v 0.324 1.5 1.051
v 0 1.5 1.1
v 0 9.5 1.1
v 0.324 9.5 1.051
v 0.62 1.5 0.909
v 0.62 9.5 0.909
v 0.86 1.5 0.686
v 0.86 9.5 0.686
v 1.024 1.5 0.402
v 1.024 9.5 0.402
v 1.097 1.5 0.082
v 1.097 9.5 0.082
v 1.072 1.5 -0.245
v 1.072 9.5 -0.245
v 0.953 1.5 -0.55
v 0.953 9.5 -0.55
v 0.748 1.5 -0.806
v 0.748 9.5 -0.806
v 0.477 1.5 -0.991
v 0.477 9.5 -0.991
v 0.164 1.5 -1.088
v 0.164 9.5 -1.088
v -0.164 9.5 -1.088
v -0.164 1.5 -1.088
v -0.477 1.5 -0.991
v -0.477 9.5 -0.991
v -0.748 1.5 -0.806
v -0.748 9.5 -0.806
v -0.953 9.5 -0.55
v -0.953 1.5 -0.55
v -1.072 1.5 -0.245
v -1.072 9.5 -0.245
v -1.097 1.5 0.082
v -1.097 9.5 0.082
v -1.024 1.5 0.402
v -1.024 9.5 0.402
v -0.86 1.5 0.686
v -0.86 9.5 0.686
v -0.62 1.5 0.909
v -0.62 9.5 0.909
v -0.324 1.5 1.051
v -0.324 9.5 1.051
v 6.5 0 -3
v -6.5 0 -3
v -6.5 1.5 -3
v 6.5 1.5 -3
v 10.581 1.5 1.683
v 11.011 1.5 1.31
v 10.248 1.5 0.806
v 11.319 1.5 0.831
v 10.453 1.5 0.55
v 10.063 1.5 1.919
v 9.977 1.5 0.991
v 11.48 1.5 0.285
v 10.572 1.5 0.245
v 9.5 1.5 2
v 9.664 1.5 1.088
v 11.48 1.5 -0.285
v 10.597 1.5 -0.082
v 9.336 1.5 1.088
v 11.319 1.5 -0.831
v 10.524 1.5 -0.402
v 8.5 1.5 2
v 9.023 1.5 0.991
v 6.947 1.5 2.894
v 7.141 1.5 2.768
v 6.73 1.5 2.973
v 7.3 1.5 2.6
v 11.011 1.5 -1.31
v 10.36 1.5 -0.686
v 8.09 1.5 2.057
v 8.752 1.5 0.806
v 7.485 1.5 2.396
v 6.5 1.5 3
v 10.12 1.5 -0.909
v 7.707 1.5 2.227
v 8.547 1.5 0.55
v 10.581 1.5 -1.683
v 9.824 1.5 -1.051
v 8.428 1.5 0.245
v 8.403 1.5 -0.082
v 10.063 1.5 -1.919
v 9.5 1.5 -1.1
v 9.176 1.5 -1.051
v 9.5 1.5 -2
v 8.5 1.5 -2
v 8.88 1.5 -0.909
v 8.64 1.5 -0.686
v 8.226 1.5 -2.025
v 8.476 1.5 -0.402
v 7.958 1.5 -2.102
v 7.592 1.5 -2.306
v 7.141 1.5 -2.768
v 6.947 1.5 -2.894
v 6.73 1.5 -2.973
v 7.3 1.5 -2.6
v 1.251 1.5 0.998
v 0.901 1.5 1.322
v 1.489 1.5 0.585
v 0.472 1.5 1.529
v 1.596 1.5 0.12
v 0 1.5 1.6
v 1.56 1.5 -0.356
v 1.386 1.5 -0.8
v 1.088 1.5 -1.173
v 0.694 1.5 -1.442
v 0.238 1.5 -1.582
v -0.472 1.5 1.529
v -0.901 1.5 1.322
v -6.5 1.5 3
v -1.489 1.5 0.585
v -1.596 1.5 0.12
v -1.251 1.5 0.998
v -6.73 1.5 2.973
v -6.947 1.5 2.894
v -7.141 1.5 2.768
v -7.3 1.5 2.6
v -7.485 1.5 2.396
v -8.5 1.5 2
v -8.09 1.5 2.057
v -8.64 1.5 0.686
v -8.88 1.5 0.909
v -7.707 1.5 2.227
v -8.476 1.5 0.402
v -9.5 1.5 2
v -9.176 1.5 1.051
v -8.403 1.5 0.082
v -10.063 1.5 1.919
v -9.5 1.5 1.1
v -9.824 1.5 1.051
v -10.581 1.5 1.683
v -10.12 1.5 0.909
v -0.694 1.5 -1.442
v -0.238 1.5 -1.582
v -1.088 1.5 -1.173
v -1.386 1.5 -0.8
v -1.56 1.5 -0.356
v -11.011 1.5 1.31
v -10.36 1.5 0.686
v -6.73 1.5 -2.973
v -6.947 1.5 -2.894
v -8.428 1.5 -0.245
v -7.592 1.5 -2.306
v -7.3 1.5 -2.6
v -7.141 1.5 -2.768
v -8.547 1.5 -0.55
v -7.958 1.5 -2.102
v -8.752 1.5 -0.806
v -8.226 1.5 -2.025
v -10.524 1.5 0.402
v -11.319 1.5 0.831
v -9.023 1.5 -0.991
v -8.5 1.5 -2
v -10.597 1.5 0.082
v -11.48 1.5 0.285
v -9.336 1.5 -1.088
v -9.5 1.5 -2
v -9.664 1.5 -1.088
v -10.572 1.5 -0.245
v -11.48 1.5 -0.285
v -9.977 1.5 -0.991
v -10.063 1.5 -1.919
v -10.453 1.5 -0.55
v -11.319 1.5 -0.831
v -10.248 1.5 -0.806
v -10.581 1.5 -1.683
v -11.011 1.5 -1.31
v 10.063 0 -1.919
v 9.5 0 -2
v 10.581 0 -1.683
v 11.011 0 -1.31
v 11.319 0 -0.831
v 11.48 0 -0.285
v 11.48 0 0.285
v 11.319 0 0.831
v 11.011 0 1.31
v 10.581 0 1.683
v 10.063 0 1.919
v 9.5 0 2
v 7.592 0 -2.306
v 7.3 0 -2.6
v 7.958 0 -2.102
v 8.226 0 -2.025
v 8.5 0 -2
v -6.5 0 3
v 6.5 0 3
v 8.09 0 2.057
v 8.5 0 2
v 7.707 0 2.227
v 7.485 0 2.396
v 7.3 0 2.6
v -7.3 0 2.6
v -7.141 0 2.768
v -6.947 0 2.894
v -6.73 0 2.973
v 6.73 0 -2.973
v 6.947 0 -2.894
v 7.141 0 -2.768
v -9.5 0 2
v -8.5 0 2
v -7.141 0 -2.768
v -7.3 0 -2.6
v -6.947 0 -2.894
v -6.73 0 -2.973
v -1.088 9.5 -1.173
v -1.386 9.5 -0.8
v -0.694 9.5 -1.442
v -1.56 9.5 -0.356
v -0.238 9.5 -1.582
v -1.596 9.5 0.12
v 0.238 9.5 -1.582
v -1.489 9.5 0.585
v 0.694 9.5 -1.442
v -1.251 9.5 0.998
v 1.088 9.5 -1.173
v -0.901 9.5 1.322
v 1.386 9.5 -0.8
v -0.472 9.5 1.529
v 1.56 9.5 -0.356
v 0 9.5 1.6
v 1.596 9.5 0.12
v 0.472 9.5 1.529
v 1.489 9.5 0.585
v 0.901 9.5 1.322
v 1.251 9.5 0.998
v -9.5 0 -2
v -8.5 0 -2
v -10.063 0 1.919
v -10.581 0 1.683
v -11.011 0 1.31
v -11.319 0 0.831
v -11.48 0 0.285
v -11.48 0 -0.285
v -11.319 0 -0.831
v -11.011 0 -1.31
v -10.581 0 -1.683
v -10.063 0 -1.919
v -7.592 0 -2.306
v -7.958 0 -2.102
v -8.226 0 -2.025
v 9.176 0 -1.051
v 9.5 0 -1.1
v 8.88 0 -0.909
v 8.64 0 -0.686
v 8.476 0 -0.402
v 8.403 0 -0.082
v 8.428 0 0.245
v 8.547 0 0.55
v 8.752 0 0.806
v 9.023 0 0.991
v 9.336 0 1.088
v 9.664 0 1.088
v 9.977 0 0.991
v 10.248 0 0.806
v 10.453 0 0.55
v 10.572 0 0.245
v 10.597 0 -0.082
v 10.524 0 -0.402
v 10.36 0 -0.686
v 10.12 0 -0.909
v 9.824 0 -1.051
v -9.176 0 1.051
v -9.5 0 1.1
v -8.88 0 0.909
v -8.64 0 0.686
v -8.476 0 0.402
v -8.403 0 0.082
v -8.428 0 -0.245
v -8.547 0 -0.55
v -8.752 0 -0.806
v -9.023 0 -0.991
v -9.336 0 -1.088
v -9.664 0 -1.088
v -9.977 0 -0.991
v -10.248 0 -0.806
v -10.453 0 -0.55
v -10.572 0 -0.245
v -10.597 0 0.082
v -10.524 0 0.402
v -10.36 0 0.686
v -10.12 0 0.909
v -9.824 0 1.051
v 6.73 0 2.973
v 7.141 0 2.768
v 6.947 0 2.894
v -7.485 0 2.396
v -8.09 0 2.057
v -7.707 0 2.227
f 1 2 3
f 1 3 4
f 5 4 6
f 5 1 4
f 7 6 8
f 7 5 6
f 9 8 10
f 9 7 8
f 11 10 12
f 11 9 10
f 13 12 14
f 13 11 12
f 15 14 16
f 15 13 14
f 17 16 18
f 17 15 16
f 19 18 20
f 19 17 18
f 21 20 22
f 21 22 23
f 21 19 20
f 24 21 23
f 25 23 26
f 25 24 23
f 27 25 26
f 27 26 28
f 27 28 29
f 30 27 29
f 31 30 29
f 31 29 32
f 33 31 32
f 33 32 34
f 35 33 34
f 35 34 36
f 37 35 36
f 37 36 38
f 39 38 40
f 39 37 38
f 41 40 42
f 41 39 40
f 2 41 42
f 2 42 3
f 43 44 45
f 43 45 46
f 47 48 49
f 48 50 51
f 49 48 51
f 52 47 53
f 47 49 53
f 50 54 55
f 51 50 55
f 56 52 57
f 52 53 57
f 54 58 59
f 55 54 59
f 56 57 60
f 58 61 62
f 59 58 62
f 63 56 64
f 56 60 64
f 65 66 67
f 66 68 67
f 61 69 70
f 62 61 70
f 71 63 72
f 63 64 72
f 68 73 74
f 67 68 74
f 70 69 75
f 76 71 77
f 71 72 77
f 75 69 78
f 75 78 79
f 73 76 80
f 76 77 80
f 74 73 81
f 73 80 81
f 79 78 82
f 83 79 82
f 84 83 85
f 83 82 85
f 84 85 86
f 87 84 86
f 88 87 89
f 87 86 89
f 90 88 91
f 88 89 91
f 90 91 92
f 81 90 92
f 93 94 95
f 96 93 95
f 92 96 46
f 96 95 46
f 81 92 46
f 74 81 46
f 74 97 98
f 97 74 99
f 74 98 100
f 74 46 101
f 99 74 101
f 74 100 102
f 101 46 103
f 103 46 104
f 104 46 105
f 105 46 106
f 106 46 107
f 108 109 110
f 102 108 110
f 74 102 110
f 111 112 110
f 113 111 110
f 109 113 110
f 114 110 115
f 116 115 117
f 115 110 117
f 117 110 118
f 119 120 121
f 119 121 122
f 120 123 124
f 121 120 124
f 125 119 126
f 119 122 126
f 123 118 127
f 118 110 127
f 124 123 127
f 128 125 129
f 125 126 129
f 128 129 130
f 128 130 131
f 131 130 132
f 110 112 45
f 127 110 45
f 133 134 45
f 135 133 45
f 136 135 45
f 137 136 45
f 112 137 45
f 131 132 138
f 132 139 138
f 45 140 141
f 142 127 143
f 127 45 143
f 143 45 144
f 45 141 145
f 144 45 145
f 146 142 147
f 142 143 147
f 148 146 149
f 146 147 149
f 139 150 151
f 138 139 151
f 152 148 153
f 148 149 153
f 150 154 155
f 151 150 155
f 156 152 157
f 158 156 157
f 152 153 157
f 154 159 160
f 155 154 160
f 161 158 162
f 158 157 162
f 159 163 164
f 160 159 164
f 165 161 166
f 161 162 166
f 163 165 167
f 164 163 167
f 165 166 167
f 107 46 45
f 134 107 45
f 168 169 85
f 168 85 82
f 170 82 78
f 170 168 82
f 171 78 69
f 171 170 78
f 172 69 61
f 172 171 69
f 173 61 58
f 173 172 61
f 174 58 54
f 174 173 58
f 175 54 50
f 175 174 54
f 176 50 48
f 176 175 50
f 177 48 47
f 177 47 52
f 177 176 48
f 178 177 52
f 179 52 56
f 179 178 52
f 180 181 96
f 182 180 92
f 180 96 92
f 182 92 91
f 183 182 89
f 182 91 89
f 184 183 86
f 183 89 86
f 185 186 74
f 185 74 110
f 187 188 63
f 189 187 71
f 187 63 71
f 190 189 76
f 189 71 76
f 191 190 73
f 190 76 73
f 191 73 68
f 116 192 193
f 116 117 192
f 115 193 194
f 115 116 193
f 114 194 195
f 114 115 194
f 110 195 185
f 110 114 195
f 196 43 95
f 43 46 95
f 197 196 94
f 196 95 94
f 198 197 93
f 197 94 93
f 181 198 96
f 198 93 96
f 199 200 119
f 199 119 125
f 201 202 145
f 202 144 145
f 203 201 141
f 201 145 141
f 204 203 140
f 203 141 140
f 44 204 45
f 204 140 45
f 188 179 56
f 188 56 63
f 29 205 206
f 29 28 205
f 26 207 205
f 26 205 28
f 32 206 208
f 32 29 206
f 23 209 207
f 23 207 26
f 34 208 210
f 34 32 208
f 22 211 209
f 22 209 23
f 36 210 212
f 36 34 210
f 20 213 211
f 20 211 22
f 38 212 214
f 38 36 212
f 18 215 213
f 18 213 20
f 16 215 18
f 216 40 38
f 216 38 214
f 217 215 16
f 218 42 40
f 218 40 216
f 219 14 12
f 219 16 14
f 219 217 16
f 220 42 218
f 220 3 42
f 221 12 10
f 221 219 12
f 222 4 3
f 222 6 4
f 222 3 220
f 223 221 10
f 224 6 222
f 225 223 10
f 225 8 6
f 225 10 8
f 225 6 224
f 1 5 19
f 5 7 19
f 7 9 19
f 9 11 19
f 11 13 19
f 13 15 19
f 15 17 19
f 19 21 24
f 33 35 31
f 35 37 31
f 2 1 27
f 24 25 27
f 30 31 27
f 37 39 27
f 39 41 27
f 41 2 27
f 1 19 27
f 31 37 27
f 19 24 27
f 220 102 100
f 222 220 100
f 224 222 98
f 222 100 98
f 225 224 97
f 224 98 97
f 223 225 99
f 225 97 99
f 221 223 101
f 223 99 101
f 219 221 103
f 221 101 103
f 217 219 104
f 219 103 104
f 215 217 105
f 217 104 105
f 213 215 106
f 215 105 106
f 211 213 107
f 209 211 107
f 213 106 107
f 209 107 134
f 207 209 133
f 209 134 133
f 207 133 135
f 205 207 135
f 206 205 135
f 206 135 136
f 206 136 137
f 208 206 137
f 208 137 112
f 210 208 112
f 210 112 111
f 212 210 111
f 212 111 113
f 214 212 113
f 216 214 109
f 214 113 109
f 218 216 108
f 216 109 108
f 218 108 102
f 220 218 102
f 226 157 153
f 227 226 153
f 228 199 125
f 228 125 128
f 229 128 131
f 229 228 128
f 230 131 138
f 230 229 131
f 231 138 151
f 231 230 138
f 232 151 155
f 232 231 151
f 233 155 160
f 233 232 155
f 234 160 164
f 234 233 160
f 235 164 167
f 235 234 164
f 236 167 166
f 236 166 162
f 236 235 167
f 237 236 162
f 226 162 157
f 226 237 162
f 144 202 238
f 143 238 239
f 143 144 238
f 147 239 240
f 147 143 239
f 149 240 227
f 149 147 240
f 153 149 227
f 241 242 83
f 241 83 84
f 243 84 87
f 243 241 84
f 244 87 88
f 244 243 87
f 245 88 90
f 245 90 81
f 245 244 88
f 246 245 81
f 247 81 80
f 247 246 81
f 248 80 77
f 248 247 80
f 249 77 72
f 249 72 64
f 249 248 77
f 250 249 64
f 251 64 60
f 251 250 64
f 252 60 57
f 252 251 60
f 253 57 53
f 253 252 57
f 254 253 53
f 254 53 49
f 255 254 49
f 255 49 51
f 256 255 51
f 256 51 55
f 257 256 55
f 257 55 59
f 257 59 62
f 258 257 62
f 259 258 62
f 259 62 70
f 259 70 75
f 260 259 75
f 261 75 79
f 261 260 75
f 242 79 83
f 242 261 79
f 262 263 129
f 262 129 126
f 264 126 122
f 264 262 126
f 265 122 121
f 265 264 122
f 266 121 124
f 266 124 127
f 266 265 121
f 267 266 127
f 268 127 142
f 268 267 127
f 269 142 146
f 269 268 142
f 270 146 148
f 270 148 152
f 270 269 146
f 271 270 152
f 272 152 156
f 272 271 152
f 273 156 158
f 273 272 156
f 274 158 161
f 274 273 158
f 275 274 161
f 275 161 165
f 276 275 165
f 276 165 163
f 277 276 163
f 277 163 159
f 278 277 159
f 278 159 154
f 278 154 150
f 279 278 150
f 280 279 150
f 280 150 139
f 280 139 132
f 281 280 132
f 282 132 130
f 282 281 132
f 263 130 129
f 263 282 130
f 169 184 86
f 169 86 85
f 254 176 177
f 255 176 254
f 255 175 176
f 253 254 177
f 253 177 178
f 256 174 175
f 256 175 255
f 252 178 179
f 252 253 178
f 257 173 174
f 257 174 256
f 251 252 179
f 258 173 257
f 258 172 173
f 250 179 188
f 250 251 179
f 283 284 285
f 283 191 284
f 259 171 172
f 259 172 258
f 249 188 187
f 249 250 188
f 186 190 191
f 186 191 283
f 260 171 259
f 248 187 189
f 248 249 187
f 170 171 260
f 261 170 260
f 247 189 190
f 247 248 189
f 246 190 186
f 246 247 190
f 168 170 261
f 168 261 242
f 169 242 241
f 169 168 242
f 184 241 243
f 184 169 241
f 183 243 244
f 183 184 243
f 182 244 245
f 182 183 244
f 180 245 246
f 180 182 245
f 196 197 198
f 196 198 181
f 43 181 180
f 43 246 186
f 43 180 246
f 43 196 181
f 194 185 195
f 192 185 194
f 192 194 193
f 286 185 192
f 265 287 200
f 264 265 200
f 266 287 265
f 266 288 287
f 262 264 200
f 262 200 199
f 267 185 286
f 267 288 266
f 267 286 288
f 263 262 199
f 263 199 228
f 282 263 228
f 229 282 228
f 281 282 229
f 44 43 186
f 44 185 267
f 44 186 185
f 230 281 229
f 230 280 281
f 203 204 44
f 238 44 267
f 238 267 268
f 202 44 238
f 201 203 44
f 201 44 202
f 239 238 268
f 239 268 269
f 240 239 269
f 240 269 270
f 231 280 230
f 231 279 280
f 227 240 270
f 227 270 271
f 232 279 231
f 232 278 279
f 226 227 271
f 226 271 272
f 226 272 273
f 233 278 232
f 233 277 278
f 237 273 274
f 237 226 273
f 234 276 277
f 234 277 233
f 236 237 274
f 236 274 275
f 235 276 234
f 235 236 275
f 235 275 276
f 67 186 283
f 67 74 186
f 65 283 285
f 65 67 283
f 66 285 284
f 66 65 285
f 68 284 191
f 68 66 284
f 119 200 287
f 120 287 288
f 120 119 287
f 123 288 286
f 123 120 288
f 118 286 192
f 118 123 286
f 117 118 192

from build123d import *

# Parameters (mm, degrees)
SKETCH1_R           = 1.1
BOSS_EXTRUDE1_DEPTH = 1.5
FILLET1_R           = 1
FILLET2_R           = 1.5
SKETCH2_R           = 1.6
SKETCH2_R_2         = 1.1
BOSS_EXTRUDE2_DEPTH = 8


with BuildPart() as part:
    # Sketch1 → Boss-Extrude1 (new body)
    with BuildSketch(Plane(origin=(0, 0, 0), x_dir=(1, 0, 0), z_dir=(0, 1, 0))):
        with BuildLine():
            Line((-9.5, 2), (-7.5, 2))
            Line((-7.5, 2), (-7.5, 3))
            Line((-7.5, 3), (7.5, 3))
            Line((7.5, 3), (7.5, 2))
            Line((7.5, 2), (9.5, 2))
            ThreePointArc((9.5, 2), (11.5, 0), (9.5, -2))
            Line((9.5, -2), (7.5, -2))
            Line((7.5, -2), (7.5, -3))
            Line((7.5, -3), (-7.5, -3))
            Line((-7.5, -3), (-7.5, -2))
            Line((-7.5, -2), (-9.5, -2))
            ThreePointArc((-9.5, -2), (-11.5, 0), (-9.5, 2))
        make_face()
        with Locations(Location((-9.5, 0, 0), (0, 0, 270))):
            Circle(SKETCH1_R, mode=Mode.SUBTRACT)
        with Locations(Location((9.5, 0, 0), (0, 0, 90))):
            Circle(SKETCH1_R, mode=Mode.SUBTRACT)
    extrude(amount=BOSS_EXTRUDE1_DEPTH)

    # Fillet1
    fillet1_edges = [part.edges().sort_by_distance(p)[0] for p in [
        (7.5, 0.75, 3),
        (7.5, 0.75, -3),
        (-7.5, 0.75, -3),
        (-7.5, 0.75, 3),
    ]]
    fillet(fillet1_edges, radius=FILLET1_R - 0.0001)  # a hair under: the kernel refuses the full size

    # Fillet2
    fillet2_edges = [part.edges().sort_by_distance(p)[0] for p in [
        (7.5, 0.75, -2),
        (7.5, 0.75, 2),
        (-7.5, 0.75, 2),
        (-7.5, 0.75, -2),
    ]]
    fillet(fillet2_edges, radius=FILLET2_R)

    # Sketch2 → Boss-Extrude2 (add)
    with BuildSketch(Plane(origin=(0, 1.5, 0), x_dir=(1, 0, 0), z_dir=(0, 1, 0))):
        with Locations(Location((0, 0, 0), (0, 0, 270))):
            Circle(SKETCH2_R)
        with Locations(Location((0, 0, 0), (0, 0, 270))):
            Circle(SKETCH2_R_2, mode=Mode.SUBTRACT)
    extrude(amount=BOSS_EXTRUDE2_DEPTH)


solid = part.part
